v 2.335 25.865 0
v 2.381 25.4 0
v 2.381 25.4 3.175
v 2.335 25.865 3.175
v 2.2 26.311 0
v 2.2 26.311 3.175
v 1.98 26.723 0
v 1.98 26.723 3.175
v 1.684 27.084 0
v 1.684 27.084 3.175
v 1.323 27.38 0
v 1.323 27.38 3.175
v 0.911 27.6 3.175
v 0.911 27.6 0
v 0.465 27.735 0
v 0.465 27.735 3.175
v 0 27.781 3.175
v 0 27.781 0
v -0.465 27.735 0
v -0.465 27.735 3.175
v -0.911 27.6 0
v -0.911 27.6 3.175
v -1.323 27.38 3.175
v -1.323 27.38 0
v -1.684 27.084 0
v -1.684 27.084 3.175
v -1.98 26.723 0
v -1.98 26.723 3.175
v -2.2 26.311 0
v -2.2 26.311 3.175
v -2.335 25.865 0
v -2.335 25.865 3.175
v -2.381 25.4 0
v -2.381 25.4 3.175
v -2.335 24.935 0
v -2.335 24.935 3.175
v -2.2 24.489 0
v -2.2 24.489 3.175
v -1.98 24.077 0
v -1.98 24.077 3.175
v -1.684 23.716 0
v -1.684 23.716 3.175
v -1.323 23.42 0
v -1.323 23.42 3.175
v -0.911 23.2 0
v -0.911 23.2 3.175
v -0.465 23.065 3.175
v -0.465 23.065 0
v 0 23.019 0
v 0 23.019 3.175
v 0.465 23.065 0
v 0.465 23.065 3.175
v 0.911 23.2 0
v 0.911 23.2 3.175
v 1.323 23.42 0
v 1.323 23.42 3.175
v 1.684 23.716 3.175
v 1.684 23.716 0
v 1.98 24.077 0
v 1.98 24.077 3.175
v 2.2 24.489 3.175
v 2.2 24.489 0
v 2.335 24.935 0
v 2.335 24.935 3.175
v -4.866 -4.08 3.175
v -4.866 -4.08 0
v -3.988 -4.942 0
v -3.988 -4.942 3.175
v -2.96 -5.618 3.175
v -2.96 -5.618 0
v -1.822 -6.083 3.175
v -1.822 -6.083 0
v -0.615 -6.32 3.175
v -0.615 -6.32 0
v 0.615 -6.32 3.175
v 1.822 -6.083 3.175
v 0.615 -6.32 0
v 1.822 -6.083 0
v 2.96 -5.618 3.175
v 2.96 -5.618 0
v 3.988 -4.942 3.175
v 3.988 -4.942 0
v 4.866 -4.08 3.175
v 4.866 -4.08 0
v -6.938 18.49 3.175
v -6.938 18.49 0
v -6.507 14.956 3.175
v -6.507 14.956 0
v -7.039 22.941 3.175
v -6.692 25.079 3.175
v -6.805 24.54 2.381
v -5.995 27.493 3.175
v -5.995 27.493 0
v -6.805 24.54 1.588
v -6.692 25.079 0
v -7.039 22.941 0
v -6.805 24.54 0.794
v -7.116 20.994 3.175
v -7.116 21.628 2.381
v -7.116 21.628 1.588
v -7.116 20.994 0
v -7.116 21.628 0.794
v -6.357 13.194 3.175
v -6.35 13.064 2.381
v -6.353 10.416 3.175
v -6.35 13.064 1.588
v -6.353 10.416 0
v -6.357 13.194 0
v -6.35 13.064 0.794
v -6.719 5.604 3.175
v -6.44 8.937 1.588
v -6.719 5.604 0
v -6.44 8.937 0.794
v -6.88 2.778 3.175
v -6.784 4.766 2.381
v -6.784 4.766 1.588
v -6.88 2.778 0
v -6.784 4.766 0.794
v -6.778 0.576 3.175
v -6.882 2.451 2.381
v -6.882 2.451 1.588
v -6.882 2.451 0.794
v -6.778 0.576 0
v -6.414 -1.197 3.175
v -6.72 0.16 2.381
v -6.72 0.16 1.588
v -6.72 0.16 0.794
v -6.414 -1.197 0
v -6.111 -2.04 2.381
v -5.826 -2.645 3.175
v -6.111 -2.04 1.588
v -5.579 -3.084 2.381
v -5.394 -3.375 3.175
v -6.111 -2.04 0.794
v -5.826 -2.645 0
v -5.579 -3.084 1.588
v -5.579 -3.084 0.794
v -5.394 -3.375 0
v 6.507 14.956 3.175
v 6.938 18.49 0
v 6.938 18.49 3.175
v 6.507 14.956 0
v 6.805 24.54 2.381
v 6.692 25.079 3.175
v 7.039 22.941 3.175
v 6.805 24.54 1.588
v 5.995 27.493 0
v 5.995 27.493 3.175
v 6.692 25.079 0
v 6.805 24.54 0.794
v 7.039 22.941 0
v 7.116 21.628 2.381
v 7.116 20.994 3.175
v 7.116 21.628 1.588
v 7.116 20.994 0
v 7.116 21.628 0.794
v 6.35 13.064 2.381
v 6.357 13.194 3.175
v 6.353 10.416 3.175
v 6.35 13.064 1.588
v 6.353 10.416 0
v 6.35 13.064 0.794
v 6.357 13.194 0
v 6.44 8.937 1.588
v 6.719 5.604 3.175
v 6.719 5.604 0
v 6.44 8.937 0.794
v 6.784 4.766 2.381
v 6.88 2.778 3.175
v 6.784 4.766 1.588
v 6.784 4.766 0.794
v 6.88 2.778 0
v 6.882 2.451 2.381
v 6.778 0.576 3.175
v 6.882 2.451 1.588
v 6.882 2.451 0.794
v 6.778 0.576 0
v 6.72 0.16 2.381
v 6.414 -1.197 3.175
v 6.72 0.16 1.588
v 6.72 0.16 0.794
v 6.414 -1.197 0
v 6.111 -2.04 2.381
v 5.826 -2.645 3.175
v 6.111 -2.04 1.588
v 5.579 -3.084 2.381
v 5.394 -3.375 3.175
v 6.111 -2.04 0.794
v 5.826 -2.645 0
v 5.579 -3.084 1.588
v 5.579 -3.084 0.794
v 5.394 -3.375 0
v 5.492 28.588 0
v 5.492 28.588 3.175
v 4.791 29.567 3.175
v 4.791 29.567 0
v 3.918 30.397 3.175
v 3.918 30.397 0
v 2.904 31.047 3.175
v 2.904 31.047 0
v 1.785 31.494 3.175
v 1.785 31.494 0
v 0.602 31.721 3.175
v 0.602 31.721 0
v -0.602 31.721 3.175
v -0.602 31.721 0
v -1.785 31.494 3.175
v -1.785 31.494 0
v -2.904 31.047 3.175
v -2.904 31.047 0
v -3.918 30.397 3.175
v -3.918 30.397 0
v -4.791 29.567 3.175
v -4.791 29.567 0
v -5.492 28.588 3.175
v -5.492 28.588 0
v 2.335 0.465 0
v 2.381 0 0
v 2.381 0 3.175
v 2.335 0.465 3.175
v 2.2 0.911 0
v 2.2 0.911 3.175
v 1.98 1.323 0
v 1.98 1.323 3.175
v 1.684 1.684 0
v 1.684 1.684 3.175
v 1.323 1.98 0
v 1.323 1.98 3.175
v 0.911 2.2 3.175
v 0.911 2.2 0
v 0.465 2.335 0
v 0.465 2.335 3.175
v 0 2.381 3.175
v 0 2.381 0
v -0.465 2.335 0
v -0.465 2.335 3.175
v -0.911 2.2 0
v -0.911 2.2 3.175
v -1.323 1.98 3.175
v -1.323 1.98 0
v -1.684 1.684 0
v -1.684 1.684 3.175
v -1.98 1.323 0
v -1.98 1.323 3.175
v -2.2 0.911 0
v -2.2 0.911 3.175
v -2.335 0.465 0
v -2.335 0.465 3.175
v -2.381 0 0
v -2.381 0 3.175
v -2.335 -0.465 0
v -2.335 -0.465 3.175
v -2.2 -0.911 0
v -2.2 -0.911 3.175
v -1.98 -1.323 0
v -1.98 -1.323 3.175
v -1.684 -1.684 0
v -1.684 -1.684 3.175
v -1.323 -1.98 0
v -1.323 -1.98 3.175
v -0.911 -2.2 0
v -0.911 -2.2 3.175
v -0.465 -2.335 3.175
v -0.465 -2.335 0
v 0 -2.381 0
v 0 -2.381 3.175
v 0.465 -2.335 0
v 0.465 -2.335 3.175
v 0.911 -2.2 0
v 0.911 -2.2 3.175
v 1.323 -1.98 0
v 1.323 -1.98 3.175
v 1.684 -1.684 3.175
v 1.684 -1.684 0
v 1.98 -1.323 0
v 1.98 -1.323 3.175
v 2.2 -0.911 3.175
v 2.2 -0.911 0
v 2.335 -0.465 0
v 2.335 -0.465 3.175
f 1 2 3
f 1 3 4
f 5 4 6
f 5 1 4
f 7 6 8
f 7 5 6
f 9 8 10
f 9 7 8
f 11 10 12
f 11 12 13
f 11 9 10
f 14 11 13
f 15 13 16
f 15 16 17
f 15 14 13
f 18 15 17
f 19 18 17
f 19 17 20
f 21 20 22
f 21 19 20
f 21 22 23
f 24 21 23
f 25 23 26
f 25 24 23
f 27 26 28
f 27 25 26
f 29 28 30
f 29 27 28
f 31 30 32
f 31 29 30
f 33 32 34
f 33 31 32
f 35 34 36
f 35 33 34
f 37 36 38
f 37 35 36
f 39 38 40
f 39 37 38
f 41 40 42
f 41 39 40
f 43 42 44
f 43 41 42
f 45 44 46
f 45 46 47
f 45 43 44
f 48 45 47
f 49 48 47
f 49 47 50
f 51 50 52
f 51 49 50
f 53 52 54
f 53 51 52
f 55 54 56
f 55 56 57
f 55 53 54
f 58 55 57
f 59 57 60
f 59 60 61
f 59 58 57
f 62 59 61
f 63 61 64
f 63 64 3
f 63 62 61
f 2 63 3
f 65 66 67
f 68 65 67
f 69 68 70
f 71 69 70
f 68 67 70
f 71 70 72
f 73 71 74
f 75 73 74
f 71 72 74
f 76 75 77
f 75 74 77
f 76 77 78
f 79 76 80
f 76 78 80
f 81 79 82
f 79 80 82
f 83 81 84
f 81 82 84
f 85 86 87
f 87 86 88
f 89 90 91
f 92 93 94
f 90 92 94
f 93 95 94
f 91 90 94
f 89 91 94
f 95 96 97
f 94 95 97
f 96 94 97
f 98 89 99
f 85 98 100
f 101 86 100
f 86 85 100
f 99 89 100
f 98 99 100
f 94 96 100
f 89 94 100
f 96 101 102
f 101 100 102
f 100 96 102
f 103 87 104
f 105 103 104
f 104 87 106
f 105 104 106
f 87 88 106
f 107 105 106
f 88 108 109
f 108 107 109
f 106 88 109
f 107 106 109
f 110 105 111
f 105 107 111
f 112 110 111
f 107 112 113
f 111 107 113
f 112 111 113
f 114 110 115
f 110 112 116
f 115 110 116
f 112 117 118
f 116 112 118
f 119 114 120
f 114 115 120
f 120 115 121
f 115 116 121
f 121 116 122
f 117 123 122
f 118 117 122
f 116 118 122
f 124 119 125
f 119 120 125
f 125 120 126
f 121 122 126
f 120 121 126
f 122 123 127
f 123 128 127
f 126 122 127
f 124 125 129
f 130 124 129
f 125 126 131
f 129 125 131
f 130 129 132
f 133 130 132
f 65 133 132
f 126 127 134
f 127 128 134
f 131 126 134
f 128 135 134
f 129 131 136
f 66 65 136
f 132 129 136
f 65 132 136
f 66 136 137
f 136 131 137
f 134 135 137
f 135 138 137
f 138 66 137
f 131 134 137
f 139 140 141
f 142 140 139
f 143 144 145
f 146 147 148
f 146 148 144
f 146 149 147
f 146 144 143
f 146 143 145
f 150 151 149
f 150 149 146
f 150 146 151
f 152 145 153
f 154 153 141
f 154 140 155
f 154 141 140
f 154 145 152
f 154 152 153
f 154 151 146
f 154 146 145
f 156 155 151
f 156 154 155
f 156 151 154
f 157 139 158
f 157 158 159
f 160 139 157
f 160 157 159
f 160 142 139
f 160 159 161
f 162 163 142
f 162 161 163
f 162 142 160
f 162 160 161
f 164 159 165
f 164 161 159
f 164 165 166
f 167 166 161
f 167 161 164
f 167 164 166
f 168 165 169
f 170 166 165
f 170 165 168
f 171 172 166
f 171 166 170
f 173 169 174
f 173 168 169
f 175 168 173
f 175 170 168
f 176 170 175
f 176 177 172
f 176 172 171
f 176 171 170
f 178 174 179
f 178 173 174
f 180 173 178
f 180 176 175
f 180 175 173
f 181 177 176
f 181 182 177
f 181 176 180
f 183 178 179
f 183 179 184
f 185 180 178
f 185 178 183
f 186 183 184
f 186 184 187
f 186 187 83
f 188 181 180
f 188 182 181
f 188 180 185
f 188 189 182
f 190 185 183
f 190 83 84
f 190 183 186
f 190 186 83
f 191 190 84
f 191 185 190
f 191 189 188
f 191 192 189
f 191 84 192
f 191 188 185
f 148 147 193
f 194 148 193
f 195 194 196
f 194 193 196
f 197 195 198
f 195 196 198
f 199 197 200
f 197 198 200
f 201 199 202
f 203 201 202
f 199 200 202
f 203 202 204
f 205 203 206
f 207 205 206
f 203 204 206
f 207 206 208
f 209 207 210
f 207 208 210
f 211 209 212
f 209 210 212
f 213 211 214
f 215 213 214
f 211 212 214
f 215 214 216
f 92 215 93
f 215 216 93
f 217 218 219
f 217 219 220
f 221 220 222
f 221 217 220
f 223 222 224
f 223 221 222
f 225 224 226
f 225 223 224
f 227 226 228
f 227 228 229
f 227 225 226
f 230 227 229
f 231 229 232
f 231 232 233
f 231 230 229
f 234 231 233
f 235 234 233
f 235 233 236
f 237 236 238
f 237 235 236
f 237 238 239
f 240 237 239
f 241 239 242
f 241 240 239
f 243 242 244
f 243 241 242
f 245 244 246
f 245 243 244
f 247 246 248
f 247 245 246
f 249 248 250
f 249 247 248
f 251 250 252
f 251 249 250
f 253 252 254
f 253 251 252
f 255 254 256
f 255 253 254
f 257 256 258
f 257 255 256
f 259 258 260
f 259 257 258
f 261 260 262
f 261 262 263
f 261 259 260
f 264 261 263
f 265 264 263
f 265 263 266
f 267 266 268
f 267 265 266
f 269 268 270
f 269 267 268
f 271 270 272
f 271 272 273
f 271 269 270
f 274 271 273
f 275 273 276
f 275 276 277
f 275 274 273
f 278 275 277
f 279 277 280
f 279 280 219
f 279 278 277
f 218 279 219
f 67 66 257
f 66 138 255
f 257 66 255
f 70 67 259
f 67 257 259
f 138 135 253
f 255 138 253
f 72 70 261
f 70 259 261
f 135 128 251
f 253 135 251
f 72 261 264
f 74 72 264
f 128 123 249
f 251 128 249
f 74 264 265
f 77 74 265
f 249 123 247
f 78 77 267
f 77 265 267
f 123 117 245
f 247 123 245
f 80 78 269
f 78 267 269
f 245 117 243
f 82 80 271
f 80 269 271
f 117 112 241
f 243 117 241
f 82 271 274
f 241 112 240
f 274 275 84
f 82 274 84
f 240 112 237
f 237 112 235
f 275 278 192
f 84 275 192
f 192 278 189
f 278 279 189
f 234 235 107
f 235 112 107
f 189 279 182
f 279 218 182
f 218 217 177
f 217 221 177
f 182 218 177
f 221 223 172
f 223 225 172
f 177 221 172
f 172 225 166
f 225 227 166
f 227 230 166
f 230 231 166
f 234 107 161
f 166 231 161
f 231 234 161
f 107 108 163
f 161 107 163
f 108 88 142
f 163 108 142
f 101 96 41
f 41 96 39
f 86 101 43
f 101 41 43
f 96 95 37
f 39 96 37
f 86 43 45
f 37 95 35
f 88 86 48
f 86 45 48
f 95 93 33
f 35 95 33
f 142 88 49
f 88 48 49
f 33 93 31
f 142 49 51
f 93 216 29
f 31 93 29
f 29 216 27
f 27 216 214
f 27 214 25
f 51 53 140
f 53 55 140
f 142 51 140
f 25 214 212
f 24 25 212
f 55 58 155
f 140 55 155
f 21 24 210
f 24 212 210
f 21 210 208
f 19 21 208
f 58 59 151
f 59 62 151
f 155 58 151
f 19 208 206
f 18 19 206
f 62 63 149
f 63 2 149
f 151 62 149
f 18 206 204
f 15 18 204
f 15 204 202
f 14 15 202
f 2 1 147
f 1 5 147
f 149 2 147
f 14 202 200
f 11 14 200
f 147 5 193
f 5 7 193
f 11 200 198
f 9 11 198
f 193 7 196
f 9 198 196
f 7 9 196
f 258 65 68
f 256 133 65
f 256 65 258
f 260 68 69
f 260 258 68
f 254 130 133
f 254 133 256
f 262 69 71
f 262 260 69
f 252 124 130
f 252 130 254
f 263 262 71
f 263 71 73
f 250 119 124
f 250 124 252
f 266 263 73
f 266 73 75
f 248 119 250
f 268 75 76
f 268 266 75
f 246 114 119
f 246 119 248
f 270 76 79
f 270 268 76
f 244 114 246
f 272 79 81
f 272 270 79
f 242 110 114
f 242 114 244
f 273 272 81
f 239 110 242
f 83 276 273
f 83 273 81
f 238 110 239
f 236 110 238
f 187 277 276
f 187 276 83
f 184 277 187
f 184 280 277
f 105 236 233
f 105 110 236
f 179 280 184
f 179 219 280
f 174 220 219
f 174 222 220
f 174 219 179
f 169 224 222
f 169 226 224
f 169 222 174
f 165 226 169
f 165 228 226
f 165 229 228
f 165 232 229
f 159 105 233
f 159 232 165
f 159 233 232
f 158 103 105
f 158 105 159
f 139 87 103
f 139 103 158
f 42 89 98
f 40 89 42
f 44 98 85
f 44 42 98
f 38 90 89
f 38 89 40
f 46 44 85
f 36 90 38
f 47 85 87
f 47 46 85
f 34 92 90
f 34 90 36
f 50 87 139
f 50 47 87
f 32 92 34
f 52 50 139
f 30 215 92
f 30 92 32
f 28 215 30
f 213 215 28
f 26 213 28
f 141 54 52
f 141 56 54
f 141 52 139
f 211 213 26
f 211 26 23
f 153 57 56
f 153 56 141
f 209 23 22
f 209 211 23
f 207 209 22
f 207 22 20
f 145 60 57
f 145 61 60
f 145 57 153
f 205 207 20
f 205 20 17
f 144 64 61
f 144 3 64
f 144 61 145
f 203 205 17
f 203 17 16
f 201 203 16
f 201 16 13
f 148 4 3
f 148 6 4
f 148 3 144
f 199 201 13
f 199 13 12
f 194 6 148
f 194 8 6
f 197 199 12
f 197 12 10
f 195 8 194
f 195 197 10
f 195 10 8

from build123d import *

# Parameters (mm, degrees)
SKETCH1_R           = 2.38125
BOSS_EXTRUDE1_DEPTH = 3.175


with BuildPart() as part:
    # Sketch1 → Boss-Extrude1 (new body)
    with BuildSketch(Plane.XY):
        with BuildLine():
            ThreePointArc((5.995089754, 27.493179122), (0, 31.75), (-5.995089754, 27.493179122))
            add(Edge.make_bspline(
                [(-5.995089754, 27.493179122), (-6.695447175, 25.487280271), (-7.636062062, 20.832001378), (-5.83605341, 13.118062743), (-6.979750328, 4.623489499), (-7.03277938, -1.495925245), (-4.865611487, -4.080235883)],
                knots=[0, 0, 0, 0, 0.186998848, 0.456275956, 0.716521227, 1, 1, 1, 1], degree=3))
            ThreePointArc((-4.865611487, -4.080235883), (0, -6.35), (4.865611487, -4.080235883))
            add(Edge.make_bspline(
                [(5.995089754, 27.493179122), (6.695447175, 25.487280271), (7.636062062, 20.832001378), (5.83605341, 13.118062743), (6.979750328, 4.623489499), (7.03277938, -1.495925245), (4.865611487, -4.080235883)],
                knots=[0, 0, 0, 0, 0.186998848, 0.456275956, 0.716521227, 1, 1, 1, 1], degree=3))
        make_face()
        with Locations((0, 25.4)):
            Circle(SKETCH1_R, mode=Mode.SUBTRACT)
        Circle(SKETCH1_R, mode=Mode.SUBTRACT)
    extrude(amount=BOSS_EXTRUDE1_DEPTH)


solid = part.part
